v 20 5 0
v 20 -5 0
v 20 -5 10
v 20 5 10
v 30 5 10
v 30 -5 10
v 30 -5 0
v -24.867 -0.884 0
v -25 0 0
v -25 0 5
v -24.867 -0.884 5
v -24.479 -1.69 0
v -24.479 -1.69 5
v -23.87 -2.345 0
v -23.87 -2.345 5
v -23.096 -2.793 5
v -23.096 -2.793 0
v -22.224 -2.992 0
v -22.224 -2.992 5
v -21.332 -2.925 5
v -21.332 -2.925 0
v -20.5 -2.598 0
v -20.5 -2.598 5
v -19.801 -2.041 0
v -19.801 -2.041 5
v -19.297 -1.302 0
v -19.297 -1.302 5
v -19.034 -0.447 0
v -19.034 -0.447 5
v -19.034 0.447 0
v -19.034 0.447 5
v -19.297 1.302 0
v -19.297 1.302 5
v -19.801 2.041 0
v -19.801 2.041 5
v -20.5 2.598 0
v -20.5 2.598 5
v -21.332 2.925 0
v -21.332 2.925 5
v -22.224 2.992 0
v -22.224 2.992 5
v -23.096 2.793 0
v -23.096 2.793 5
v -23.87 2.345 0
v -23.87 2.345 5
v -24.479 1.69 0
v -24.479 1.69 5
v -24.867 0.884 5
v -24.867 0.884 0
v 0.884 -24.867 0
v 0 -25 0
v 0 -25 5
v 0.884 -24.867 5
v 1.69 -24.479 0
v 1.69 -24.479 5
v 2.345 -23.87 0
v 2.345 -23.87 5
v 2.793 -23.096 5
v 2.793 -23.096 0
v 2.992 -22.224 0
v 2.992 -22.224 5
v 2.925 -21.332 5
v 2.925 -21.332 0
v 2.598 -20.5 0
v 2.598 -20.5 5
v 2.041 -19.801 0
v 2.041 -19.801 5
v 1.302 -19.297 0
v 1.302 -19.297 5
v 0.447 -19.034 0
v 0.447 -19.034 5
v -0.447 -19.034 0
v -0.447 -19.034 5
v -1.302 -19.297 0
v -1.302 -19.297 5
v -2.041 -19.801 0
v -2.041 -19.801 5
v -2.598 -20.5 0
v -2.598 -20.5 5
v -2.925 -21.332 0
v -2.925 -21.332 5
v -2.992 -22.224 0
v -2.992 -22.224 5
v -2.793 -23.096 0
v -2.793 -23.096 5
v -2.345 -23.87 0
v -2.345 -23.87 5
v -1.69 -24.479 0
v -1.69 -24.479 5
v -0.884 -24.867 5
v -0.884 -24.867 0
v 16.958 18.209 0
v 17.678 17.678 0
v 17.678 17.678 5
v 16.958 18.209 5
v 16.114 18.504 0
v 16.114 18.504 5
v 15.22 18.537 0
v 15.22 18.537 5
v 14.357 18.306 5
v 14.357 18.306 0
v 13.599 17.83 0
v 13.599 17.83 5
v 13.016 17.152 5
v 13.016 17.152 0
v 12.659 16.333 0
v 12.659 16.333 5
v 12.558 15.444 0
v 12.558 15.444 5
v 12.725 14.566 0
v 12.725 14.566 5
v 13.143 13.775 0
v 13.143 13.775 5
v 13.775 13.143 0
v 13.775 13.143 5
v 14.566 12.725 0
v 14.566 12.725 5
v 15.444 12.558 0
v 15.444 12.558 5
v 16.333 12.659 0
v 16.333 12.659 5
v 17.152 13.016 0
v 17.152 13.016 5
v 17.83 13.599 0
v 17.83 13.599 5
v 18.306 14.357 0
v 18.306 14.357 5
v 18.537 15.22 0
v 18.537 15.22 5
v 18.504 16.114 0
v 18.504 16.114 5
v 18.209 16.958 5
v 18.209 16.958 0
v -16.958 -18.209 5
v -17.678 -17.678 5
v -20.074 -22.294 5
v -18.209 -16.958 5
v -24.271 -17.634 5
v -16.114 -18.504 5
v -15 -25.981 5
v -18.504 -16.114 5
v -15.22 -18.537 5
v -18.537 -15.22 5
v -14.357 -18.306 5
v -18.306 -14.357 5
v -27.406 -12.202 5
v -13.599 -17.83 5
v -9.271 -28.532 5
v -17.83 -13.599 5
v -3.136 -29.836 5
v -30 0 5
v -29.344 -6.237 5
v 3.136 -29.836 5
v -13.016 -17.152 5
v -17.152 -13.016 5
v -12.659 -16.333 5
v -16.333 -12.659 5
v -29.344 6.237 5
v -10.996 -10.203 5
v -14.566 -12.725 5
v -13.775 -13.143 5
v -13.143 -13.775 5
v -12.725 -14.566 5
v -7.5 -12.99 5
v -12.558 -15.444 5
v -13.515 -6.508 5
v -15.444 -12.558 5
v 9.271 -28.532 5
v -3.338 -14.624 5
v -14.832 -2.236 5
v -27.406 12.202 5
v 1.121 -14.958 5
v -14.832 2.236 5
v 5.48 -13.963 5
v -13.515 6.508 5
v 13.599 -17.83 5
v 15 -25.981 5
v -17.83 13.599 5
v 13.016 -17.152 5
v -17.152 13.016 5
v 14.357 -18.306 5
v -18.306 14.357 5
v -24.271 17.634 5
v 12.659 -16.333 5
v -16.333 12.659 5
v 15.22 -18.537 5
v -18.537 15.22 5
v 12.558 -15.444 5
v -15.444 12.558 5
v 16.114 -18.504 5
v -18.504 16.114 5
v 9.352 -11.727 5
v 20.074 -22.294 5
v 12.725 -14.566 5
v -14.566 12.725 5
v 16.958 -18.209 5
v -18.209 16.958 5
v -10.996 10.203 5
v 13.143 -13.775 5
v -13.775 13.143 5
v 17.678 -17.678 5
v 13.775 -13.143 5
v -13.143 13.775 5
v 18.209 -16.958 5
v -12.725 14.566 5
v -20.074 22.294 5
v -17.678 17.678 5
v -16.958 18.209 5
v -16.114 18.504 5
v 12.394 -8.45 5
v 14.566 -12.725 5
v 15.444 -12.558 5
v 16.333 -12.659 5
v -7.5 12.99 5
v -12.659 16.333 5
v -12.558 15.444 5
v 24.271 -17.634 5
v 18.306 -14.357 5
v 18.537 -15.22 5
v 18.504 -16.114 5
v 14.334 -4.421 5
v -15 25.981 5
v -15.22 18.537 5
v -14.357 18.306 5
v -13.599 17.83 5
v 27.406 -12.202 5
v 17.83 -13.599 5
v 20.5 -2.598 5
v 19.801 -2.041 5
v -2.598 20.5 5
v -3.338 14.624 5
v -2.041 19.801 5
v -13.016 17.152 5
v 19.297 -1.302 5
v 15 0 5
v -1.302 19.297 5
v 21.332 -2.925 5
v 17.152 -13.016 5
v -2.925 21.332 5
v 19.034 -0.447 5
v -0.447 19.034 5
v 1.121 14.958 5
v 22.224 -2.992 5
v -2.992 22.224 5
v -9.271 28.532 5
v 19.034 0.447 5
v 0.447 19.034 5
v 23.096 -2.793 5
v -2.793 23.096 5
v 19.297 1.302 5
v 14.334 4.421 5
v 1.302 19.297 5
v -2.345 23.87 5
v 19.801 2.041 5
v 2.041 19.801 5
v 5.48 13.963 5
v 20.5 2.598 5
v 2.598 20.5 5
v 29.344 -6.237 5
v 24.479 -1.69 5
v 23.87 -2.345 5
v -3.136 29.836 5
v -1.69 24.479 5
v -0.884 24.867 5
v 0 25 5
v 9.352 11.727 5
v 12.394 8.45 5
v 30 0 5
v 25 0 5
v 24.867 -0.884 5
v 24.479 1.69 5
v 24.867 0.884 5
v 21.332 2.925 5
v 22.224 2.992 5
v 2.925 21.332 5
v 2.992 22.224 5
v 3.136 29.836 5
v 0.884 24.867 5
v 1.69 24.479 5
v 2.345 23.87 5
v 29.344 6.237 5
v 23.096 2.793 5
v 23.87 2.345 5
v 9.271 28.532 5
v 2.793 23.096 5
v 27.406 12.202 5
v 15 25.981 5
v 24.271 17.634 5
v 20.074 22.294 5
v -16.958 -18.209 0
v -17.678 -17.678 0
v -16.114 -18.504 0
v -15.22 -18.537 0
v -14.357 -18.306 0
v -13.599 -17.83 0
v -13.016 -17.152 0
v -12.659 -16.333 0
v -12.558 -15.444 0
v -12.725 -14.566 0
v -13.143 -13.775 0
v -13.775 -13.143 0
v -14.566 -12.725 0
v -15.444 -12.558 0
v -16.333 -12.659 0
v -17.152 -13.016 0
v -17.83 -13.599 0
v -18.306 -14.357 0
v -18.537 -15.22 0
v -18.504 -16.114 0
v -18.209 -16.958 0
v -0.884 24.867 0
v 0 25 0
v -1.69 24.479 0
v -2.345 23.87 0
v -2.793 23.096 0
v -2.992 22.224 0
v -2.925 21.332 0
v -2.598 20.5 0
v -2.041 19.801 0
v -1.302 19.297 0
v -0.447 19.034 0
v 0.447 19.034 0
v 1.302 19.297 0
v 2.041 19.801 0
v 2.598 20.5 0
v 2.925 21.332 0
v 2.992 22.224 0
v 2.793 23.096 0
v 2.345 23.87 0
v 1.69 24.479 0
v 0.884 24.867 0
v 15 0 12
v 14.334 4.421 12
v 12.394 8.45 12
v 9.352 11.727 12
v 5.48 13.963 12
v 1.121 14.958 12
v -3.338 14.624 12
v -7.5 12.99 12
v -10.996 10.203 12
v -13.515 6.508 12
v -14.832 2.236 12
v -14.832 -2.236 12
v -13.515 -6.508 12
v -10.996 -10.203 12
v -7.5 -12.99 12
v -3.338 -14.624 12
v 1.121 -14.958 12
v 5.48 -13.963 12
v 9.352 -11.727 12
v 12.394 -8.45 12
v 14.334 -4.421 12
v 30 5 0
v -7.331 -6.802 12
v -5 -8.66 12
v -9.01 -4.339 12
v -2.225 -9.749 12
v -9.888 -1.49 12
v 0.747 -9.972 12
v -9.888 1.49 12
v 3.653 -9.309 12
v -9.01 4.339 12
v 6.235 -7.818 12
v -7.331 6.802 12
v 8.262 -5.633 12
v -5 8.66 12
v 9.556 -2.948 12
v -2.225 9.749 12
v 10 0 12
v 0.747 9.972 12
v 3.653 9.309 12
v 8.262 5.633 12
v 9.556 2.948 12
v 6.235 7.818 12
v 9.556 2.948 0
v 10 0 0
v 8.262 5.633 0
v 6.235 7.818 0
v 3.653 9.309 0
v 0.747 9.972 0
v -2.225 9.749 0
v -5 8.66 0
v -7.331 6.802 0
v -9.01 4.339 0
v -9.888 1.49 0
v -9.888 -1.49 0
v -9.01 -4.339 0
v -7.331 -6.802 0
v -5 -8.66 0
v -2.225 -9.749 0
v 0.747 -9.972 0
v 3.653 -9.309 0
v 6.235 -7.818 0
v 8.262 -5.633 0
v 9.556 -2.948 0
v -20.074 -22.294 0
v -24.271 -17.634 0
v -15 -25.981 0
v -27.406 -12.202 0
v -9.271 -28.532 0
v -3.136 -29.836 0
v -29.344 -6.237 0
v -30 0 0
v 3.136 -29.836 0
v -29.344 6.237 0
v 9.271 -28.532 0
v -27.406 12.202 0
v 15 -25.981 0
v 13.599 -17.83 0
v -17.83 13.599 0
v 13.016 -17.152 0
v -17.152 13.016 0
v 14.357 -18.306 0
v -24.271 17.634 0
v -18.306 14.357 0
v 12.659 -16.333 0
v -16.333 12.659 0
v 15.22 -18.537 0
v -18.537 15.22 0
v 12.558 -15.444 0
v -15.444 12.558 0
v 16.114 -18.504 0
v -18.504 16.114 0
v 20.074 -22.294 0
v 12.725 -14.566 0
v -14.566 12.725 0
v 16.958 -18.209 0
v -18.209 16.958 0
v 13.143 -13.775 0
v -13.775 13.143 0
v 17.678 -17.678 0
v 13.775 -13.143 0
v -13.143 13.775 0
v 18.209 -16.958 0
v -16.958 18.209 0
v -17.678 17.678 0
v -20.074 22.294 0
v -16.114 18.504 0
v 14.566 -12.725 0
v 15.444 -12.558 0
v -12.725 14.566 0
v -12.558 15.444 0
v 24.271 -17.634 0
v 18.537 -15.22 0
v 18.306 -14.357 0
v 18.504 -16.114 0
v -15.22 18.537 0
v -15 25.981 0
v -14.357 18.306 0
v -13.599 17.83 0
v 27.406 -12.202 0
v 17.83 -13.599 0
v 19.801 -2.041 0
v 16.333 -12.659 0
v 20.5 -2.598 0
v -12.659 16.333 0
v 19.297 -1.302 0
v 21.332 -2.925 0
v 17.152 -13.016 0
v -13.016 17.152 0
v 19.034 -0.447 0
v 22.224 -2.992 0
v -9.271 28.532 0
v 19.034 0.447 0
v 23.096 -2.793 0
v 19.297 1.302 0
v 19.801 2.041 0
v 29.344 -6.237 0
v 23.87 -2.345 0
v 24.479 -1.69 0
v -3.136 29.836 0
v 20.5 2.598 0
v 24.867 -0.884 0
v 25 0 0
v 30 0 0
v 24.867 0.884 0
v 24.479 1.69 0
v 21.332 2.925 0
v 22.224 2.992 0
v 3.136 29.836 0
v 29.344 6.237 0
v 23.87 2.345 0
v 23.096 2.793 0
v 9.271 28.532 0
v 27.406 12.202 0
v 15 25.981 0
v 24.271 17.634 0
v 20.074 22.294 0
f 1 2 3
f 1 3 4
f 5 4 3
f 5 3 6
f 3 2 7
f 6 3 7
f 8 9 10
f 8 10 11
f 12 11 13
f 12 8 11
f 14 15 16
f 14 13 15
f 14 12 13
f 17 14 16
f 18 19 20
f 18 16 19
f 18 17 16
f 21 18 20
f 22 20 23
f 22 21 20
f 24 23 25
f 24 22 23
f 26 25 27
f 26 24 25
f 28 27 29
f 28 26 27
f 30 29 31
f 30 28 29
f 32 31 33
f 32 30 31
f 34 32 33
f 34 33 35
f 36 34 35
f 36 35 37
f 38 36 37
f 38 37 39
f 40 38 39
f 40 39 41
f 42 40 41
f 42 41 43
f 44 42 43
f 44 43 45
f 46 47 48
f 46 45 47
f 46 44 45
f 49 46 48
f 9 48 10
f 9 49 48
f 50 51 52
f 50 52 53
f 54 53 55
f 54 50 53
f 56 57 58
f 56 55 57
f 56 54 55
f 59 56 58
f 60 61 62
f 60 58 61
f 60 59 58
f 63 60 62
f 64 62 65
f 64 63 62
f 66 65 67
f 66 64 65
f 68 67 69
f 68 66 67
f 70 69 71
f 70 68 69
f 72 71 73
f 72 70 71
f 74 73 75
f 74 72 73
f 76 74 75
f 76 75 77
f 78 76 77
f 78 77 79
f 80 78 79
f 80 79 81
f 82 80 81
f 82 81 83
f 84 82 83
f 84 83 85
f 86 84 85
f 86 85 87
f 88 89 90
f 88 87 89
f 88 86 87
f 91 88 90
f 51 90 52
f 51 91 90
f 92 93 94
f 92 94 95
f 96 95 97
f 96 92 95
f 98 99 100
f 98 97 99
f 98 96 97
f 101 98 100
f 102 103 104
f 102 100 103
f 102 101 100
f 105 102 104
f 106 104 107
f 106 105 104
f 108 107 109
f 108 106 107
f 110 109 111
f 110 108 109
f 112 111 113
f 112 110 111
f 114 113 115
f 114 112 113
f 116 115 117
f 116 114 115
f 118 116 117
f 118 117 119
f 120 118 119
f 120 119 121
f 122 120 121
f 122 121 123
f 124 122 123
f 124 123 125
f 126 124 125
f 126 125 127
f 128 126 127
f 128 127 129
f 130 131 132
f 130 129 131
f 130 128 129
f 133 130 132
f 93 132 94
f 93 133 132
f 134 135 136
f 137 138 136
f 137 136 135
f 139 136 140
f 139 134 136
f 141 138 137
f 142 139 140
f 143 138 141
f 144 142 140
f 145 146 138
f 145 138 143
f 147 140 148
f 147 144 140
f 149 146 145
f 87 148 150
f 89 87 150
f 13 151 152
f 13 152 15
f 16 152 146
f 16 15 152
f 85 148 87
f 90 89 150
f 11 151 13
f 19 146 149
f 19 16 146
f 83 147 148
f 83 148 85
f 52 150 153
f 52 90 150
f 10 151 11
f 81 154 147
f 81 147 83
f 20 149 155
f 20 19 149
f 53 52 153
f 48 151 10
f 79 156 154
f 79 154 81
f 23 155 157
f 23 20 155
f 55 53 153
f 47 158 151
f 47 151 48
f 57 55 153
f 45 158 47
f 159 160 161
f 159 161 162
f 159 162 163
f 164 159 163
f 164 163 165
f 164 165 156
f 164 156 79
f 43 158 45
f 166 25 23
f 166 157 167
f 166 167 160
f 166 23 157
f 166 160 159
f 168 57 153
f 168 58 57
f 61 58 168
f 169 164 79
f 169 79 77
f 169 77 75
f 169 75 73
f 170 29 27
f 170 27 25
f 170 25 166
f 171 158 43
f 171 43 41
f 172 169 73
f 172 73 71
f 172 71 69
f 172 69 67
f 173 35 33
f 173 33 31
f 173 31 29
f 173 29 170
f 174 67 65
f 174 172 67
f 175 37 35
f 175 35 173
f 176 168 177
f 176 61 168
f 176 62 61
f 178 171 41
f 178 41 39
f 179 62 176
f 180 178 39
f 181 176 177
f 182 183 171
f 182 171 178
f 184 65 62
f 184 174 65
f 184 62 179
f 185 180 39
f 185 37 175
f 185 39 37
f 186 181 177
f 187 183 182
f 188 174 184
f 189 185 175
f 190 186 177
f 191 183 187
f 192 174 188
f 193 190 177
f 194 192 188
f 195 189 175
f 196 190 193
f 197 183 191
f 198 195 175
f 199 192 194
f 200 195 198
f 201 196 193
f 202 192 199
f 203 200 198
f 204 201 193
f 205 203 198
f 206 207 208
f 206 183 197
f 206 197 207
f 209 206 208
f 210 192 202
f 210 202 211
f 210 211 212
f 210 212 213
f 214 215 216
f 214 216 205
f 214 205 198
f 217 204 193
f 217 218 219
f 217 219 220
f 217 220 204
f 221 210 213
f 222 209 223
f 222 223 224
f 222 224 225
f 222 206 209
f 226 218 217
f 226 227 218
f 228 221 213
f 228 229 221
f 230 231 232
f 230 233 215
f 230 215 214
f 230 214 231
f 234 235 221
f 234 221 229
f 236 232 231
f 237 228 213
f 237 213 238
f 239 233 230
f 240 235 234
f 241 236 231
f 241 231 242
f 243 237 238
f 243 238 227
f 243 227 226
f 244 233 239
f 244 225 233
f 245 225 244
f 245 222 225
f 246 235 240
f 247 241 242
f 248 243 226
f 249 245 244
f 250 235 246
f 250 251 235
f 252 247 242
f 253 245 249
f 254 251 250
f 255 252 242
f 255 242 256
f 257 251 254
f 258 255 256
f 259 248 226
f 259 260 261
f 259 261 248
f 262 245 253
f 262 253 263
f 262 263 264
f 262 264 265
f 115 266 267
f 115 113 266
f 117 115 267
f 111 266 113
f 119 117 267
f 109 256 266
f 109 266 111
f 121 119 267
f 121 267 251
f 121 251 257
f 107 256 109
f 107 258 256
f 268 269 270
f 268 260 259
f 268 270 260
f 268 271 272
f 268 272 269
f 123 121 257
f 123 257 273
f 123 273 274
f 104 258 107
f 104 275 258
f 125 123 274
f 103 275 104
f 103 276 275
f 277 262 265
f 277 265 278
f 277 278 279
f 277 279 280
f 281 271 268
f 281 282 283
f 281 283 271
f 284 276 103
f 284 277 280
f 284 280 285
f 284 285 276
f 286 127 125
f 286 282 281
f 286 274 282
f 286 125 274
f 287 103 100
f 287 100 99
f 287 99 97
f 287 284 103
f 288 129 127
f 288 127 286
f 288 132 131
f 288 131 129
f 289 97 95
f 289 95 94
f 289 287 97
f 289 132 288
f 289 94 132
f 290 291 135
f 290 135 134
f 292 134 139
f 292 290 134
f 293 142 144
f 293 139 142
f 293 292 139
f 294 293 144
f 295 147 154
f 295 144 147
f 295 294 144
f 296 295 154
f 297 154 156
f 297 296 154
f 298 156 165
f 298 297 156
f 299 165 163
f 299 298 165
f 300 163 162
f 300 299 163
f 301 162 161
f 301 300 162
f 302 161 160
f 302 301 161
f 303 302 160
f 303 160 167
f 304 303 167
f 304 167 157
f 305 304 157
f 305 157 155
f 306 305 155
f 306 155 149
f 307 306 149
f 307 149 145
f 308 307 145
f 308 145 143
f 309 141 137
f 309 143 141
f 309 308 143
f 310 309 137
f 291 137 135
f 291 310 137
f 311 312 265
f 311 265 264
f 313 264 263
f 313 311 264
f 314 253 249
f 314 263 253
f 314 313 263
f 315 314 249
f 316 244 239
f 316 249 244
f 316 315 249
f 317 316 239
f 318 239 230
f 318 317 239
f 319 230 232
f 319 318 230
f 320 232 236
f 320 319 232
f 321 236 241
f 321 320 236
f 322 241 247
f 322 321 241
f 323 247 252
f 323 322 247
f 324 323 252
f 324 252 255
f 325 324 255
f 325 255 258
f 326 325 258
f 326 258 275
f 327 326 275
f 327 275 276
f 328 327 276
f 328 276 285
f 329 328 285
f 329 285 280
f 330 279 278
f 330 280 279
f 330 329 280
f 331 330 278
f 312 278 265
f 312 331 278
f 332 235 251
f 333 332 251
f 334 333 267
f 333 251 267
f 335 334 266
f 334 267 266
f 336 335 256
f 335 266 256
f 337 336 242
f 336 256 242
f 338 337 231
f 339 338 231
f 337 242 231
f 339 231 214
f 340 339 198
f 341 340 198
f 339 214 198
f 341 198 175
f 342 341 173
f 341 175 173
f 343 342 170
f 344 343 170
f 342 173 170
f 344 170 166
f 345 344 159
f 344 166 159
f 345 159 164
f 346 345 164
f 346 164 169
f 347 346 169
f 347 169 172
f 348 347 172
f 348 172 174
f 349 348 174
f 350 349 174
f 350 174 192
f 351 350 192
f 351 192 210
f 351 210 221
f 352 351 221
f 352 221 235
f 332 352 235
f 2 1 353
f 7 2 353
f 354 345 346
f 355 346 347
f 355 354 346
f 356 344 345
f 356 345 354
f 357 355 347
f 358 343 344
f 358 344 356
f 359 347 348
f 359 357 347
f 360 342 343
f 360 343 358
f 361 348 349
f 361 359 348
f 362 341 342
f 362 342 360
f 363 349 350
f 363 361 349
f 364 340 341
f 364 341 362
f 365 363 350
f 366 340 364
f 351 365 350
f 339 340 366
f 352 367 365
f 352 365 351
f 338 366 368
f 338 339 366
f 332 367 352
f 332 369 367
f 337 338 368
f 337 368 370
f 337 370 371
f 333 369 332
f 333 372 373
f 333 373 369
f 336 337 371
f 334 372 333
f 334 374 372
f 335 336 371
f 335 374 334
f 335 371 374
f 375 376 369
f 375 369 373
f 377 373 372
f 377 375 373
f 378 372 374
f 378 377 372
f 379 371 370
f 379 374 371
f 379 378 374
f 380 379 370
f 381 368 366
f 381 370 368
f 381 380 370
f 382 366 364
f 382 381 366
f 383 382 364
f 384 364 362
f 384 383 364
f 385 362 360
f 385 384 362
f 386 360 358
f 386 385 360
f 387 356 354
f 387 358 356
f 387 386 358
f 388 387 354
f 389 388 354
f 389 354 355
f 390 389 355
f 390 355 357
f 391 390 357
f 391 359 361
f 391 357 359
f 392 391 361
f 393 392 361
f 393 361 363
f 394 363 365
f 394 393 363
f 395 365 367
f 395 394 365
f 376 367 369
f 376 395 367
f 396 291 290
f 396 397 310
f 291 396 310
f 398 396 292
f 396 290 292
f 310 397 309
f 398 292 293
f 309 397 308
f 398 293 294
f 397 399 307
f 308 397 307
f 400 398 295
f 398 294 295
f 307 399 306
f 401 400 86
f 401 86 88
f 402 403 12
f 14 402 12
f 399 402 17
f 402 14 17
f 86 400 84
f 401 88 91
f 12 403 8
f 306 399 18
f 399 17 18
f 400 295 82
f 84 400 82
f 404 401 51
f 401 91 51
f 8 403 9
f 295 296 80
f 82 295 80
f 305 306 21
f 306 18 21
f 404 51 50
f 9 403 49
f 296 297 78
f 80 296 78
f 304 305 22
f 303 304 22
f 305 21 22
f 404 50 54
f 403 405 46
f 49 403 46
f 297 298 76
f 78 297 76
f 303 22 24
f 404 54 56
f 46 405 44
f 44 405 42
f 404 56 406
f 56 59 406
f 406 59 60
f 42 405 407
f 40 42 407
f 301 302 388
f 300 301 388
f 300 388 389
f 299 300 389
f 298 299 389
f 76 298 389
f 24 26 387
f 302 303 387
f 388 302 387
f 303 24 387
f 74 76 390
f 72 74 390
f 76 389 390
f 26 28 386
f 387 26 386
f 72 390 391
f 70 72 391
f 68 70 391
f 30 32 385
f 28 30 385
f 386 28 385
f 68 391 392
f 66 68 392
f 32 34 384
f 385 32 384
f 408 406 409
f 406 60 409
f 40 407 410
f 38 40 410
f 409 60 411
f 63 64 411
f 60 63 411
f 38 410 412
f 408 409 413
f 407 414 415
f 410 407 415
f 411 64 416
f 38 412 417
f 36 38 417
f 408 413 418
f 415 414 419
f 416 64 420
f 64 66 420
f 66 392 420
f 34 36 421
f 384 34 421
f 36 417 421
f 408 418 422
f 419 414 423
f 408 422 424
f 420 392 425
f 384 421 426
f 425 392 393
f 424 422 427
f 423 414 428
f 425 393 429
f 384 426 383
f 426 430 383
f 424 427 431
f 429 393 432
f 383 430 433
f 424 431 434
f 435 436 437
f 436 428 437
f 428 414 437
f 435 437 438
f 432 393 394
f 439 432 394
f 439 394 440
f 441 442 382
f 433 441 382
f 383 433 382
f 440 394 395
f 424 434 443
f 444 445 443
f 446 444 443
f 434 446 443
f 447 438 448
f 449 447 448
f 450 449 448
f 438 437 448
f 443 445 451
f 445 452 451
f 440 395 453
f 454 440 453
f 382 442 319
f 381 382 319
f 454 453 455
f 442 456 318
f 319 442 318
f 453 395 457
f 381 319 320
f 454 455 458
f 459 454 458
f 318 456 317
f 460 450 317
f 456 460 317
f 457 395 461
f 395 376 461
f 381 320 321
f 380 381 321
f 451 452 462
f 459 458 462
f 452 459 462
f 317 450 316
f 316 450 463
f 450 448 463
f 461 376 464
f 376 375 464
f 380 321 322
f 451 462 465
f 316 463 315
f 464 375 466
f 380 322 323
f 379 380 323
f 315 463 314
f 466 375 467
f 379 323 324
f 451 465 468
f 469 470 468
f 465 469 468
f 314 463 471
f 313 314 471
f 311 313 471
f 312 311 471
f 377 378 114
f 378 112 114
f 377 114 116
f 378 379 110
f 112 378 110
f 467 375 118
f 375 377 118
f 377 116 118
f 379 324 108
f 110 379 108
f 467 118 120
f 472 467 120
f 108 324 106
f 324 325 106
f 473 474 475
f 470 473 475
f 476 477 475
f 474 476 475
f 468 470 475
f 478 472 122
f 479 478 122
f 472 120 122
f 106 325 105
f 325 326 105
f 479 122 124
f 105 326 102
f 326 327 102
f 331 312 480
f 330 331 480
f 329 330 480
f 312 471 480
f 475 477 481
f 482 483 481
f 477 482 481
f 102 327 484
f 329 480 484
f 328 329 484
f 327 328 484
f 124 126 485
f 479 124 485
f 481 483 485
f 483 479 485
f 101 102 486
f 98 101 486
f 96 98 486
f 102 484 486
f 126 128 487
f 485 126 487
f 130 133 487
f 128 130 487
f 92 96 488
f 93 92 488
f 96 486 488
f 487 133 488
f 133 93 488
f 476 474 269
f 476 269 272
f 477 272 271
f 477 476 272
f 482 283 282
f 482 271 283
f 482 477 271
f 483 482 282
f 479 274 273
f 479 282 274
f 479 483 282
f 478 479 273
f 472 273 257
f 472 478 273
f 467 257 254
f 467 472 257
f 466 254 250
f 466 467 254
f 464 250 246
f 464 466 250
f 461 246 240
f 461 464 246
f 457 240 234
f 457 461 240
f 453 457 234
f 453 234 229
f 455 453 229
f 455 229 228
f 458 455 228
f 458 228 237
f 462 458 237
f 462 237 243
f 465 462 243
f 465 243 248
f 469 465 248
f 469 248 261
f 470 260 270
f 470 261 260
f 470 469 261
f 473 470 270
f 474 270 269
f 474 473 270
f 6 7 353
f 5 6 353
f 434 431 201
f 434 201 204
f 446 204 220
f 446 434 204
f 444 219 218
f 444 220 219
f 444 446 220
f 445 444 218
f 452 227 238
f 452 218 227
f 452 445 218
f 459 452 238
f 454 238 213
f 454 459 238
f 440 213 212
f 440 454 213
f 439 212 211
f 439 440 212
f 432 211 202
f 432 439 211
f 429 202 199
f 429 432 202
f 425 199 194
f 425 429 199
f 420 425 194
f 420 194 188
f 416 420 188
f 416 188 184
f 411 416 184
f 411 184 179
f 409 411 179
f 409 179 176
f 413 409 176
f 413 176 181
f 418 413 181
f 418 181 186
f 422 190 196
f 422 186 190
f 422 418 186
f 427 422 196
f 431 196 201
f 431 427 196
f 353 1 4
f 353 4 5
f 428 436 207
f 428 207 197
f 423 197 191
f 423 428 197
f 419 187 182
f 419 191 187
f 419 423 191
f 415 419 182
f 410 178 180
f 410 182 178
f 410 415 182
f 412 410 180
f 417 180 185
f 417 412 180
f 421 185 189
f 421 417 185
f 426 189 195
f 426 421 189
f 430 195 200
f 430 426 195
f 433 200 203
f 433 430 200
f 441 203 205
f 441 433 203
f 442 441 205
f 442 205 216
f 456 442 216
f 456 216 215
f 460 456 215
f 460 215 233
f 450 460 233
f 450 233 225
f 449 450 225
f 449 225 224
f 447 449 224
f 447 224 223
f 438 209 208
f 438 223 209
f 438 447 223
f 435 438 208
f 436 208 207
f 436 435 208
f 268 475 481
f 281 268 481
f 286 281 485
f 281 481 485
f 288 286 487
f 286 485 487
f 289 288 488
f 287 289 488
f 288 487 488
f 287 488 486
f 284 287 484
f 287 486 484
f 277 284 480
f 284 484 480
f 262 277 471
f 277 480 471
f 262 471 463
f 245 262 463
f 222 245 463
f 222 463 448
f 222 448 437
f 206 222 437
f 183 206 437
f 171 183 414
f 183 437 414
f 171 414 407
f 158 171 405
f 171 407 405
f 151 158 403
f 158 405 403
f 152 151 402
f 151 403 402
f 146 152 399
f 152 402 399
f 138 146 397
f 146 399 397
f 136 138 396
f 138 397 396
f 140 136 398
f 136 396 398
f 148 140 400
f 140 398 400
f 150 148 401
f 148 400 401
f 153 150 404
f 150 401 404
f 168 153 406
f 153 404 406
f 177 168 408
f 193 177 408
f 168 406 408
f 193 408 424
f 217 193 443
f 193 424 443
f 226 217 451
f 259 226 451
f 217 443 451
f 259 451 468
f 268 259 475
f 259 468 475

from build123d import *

# Parameters (mm, degrees)
BOX_W             = 10
BOX_H             = 10
BOX_DEPTH         = 10
CYLINDER003_R     = 3
CYLINDER003_DEPTH = 10
ARRAY_COUNT       = 8
CYLINDER002_R     = 10
CYLINDER002_DEPTH = 30
CYLINDER001_R     = 15
CYLINDER001_DEPTH = 12
CYLINDER_R        = 30
CYLINDER_DEPTH    = 5


with BuildPart() as cub:
    # Box → Box (new body)
    with BuildSketch(Plane(origin=(20, -5, 0), x_dir=(1, 0, 0), z_dir=(0, 0, 1))):
        with Locations((5, 5)):
            Rectangle(BOX_W, BOX_H)
    extrude(amount=BOX_DEPTH)


with BuildPart() as array:
    # Cylinder003 → Cylinder003 (new body)
    with BuildSketch(Plane(origin=(22, 0, -1), x_dir=(1, 0, 0), z_dir=(0, 0, 1))):
        Circle(CYLINDER003_R)
    extrude(amount=CYLINDER003_DEPTH)

    # Array: Array ×8 about axis
    array_axis = Axis((0, 0, 0), (0, 0, 1))


with BuildPart() as array_1:
    add(array.part)
    for i in range(1, ARRAY_COUNT):
        add(array.part.rotate(array_axis, i * 360 / ARRAY_COUNT))


with BuildPart() as tub_interior:
    # Cylinder002 → Cylinder002 (new body)
    with BuildSketch(Plane.XY.offset(-1)):
        Circle(CYLINDER002_R)
    extrude(amount=CYLINDER002_DEPTH)


with BuildPart() as tub_exterior:
    # Cylinder001 → Cylinder001 (new body)
    with BuildSketch(Plane.XY):
        Circle(CYLINDER001_R)
    extrude(amount=CYLINDER001_DEPTH)


with BuildPart() as cut001:
    # Cylinder → Cylinder (new body)
    with BuildSketch(Plane.XY):
        Circle(CYLINDER_R)
    extrude(amount=CYLINDER_DEPTH)

    # Fusion: union tub exterior
    add(tub_exterior.part)

    # Cut: cut tub interior
    add(tub_interior.part, mode=Mode.SUBTRACT)

    # Cut001: cut Array
    add(array_1.part, mode=Mode.SUBTRACT)


solid = Compound([cub.part, cut001.part])
